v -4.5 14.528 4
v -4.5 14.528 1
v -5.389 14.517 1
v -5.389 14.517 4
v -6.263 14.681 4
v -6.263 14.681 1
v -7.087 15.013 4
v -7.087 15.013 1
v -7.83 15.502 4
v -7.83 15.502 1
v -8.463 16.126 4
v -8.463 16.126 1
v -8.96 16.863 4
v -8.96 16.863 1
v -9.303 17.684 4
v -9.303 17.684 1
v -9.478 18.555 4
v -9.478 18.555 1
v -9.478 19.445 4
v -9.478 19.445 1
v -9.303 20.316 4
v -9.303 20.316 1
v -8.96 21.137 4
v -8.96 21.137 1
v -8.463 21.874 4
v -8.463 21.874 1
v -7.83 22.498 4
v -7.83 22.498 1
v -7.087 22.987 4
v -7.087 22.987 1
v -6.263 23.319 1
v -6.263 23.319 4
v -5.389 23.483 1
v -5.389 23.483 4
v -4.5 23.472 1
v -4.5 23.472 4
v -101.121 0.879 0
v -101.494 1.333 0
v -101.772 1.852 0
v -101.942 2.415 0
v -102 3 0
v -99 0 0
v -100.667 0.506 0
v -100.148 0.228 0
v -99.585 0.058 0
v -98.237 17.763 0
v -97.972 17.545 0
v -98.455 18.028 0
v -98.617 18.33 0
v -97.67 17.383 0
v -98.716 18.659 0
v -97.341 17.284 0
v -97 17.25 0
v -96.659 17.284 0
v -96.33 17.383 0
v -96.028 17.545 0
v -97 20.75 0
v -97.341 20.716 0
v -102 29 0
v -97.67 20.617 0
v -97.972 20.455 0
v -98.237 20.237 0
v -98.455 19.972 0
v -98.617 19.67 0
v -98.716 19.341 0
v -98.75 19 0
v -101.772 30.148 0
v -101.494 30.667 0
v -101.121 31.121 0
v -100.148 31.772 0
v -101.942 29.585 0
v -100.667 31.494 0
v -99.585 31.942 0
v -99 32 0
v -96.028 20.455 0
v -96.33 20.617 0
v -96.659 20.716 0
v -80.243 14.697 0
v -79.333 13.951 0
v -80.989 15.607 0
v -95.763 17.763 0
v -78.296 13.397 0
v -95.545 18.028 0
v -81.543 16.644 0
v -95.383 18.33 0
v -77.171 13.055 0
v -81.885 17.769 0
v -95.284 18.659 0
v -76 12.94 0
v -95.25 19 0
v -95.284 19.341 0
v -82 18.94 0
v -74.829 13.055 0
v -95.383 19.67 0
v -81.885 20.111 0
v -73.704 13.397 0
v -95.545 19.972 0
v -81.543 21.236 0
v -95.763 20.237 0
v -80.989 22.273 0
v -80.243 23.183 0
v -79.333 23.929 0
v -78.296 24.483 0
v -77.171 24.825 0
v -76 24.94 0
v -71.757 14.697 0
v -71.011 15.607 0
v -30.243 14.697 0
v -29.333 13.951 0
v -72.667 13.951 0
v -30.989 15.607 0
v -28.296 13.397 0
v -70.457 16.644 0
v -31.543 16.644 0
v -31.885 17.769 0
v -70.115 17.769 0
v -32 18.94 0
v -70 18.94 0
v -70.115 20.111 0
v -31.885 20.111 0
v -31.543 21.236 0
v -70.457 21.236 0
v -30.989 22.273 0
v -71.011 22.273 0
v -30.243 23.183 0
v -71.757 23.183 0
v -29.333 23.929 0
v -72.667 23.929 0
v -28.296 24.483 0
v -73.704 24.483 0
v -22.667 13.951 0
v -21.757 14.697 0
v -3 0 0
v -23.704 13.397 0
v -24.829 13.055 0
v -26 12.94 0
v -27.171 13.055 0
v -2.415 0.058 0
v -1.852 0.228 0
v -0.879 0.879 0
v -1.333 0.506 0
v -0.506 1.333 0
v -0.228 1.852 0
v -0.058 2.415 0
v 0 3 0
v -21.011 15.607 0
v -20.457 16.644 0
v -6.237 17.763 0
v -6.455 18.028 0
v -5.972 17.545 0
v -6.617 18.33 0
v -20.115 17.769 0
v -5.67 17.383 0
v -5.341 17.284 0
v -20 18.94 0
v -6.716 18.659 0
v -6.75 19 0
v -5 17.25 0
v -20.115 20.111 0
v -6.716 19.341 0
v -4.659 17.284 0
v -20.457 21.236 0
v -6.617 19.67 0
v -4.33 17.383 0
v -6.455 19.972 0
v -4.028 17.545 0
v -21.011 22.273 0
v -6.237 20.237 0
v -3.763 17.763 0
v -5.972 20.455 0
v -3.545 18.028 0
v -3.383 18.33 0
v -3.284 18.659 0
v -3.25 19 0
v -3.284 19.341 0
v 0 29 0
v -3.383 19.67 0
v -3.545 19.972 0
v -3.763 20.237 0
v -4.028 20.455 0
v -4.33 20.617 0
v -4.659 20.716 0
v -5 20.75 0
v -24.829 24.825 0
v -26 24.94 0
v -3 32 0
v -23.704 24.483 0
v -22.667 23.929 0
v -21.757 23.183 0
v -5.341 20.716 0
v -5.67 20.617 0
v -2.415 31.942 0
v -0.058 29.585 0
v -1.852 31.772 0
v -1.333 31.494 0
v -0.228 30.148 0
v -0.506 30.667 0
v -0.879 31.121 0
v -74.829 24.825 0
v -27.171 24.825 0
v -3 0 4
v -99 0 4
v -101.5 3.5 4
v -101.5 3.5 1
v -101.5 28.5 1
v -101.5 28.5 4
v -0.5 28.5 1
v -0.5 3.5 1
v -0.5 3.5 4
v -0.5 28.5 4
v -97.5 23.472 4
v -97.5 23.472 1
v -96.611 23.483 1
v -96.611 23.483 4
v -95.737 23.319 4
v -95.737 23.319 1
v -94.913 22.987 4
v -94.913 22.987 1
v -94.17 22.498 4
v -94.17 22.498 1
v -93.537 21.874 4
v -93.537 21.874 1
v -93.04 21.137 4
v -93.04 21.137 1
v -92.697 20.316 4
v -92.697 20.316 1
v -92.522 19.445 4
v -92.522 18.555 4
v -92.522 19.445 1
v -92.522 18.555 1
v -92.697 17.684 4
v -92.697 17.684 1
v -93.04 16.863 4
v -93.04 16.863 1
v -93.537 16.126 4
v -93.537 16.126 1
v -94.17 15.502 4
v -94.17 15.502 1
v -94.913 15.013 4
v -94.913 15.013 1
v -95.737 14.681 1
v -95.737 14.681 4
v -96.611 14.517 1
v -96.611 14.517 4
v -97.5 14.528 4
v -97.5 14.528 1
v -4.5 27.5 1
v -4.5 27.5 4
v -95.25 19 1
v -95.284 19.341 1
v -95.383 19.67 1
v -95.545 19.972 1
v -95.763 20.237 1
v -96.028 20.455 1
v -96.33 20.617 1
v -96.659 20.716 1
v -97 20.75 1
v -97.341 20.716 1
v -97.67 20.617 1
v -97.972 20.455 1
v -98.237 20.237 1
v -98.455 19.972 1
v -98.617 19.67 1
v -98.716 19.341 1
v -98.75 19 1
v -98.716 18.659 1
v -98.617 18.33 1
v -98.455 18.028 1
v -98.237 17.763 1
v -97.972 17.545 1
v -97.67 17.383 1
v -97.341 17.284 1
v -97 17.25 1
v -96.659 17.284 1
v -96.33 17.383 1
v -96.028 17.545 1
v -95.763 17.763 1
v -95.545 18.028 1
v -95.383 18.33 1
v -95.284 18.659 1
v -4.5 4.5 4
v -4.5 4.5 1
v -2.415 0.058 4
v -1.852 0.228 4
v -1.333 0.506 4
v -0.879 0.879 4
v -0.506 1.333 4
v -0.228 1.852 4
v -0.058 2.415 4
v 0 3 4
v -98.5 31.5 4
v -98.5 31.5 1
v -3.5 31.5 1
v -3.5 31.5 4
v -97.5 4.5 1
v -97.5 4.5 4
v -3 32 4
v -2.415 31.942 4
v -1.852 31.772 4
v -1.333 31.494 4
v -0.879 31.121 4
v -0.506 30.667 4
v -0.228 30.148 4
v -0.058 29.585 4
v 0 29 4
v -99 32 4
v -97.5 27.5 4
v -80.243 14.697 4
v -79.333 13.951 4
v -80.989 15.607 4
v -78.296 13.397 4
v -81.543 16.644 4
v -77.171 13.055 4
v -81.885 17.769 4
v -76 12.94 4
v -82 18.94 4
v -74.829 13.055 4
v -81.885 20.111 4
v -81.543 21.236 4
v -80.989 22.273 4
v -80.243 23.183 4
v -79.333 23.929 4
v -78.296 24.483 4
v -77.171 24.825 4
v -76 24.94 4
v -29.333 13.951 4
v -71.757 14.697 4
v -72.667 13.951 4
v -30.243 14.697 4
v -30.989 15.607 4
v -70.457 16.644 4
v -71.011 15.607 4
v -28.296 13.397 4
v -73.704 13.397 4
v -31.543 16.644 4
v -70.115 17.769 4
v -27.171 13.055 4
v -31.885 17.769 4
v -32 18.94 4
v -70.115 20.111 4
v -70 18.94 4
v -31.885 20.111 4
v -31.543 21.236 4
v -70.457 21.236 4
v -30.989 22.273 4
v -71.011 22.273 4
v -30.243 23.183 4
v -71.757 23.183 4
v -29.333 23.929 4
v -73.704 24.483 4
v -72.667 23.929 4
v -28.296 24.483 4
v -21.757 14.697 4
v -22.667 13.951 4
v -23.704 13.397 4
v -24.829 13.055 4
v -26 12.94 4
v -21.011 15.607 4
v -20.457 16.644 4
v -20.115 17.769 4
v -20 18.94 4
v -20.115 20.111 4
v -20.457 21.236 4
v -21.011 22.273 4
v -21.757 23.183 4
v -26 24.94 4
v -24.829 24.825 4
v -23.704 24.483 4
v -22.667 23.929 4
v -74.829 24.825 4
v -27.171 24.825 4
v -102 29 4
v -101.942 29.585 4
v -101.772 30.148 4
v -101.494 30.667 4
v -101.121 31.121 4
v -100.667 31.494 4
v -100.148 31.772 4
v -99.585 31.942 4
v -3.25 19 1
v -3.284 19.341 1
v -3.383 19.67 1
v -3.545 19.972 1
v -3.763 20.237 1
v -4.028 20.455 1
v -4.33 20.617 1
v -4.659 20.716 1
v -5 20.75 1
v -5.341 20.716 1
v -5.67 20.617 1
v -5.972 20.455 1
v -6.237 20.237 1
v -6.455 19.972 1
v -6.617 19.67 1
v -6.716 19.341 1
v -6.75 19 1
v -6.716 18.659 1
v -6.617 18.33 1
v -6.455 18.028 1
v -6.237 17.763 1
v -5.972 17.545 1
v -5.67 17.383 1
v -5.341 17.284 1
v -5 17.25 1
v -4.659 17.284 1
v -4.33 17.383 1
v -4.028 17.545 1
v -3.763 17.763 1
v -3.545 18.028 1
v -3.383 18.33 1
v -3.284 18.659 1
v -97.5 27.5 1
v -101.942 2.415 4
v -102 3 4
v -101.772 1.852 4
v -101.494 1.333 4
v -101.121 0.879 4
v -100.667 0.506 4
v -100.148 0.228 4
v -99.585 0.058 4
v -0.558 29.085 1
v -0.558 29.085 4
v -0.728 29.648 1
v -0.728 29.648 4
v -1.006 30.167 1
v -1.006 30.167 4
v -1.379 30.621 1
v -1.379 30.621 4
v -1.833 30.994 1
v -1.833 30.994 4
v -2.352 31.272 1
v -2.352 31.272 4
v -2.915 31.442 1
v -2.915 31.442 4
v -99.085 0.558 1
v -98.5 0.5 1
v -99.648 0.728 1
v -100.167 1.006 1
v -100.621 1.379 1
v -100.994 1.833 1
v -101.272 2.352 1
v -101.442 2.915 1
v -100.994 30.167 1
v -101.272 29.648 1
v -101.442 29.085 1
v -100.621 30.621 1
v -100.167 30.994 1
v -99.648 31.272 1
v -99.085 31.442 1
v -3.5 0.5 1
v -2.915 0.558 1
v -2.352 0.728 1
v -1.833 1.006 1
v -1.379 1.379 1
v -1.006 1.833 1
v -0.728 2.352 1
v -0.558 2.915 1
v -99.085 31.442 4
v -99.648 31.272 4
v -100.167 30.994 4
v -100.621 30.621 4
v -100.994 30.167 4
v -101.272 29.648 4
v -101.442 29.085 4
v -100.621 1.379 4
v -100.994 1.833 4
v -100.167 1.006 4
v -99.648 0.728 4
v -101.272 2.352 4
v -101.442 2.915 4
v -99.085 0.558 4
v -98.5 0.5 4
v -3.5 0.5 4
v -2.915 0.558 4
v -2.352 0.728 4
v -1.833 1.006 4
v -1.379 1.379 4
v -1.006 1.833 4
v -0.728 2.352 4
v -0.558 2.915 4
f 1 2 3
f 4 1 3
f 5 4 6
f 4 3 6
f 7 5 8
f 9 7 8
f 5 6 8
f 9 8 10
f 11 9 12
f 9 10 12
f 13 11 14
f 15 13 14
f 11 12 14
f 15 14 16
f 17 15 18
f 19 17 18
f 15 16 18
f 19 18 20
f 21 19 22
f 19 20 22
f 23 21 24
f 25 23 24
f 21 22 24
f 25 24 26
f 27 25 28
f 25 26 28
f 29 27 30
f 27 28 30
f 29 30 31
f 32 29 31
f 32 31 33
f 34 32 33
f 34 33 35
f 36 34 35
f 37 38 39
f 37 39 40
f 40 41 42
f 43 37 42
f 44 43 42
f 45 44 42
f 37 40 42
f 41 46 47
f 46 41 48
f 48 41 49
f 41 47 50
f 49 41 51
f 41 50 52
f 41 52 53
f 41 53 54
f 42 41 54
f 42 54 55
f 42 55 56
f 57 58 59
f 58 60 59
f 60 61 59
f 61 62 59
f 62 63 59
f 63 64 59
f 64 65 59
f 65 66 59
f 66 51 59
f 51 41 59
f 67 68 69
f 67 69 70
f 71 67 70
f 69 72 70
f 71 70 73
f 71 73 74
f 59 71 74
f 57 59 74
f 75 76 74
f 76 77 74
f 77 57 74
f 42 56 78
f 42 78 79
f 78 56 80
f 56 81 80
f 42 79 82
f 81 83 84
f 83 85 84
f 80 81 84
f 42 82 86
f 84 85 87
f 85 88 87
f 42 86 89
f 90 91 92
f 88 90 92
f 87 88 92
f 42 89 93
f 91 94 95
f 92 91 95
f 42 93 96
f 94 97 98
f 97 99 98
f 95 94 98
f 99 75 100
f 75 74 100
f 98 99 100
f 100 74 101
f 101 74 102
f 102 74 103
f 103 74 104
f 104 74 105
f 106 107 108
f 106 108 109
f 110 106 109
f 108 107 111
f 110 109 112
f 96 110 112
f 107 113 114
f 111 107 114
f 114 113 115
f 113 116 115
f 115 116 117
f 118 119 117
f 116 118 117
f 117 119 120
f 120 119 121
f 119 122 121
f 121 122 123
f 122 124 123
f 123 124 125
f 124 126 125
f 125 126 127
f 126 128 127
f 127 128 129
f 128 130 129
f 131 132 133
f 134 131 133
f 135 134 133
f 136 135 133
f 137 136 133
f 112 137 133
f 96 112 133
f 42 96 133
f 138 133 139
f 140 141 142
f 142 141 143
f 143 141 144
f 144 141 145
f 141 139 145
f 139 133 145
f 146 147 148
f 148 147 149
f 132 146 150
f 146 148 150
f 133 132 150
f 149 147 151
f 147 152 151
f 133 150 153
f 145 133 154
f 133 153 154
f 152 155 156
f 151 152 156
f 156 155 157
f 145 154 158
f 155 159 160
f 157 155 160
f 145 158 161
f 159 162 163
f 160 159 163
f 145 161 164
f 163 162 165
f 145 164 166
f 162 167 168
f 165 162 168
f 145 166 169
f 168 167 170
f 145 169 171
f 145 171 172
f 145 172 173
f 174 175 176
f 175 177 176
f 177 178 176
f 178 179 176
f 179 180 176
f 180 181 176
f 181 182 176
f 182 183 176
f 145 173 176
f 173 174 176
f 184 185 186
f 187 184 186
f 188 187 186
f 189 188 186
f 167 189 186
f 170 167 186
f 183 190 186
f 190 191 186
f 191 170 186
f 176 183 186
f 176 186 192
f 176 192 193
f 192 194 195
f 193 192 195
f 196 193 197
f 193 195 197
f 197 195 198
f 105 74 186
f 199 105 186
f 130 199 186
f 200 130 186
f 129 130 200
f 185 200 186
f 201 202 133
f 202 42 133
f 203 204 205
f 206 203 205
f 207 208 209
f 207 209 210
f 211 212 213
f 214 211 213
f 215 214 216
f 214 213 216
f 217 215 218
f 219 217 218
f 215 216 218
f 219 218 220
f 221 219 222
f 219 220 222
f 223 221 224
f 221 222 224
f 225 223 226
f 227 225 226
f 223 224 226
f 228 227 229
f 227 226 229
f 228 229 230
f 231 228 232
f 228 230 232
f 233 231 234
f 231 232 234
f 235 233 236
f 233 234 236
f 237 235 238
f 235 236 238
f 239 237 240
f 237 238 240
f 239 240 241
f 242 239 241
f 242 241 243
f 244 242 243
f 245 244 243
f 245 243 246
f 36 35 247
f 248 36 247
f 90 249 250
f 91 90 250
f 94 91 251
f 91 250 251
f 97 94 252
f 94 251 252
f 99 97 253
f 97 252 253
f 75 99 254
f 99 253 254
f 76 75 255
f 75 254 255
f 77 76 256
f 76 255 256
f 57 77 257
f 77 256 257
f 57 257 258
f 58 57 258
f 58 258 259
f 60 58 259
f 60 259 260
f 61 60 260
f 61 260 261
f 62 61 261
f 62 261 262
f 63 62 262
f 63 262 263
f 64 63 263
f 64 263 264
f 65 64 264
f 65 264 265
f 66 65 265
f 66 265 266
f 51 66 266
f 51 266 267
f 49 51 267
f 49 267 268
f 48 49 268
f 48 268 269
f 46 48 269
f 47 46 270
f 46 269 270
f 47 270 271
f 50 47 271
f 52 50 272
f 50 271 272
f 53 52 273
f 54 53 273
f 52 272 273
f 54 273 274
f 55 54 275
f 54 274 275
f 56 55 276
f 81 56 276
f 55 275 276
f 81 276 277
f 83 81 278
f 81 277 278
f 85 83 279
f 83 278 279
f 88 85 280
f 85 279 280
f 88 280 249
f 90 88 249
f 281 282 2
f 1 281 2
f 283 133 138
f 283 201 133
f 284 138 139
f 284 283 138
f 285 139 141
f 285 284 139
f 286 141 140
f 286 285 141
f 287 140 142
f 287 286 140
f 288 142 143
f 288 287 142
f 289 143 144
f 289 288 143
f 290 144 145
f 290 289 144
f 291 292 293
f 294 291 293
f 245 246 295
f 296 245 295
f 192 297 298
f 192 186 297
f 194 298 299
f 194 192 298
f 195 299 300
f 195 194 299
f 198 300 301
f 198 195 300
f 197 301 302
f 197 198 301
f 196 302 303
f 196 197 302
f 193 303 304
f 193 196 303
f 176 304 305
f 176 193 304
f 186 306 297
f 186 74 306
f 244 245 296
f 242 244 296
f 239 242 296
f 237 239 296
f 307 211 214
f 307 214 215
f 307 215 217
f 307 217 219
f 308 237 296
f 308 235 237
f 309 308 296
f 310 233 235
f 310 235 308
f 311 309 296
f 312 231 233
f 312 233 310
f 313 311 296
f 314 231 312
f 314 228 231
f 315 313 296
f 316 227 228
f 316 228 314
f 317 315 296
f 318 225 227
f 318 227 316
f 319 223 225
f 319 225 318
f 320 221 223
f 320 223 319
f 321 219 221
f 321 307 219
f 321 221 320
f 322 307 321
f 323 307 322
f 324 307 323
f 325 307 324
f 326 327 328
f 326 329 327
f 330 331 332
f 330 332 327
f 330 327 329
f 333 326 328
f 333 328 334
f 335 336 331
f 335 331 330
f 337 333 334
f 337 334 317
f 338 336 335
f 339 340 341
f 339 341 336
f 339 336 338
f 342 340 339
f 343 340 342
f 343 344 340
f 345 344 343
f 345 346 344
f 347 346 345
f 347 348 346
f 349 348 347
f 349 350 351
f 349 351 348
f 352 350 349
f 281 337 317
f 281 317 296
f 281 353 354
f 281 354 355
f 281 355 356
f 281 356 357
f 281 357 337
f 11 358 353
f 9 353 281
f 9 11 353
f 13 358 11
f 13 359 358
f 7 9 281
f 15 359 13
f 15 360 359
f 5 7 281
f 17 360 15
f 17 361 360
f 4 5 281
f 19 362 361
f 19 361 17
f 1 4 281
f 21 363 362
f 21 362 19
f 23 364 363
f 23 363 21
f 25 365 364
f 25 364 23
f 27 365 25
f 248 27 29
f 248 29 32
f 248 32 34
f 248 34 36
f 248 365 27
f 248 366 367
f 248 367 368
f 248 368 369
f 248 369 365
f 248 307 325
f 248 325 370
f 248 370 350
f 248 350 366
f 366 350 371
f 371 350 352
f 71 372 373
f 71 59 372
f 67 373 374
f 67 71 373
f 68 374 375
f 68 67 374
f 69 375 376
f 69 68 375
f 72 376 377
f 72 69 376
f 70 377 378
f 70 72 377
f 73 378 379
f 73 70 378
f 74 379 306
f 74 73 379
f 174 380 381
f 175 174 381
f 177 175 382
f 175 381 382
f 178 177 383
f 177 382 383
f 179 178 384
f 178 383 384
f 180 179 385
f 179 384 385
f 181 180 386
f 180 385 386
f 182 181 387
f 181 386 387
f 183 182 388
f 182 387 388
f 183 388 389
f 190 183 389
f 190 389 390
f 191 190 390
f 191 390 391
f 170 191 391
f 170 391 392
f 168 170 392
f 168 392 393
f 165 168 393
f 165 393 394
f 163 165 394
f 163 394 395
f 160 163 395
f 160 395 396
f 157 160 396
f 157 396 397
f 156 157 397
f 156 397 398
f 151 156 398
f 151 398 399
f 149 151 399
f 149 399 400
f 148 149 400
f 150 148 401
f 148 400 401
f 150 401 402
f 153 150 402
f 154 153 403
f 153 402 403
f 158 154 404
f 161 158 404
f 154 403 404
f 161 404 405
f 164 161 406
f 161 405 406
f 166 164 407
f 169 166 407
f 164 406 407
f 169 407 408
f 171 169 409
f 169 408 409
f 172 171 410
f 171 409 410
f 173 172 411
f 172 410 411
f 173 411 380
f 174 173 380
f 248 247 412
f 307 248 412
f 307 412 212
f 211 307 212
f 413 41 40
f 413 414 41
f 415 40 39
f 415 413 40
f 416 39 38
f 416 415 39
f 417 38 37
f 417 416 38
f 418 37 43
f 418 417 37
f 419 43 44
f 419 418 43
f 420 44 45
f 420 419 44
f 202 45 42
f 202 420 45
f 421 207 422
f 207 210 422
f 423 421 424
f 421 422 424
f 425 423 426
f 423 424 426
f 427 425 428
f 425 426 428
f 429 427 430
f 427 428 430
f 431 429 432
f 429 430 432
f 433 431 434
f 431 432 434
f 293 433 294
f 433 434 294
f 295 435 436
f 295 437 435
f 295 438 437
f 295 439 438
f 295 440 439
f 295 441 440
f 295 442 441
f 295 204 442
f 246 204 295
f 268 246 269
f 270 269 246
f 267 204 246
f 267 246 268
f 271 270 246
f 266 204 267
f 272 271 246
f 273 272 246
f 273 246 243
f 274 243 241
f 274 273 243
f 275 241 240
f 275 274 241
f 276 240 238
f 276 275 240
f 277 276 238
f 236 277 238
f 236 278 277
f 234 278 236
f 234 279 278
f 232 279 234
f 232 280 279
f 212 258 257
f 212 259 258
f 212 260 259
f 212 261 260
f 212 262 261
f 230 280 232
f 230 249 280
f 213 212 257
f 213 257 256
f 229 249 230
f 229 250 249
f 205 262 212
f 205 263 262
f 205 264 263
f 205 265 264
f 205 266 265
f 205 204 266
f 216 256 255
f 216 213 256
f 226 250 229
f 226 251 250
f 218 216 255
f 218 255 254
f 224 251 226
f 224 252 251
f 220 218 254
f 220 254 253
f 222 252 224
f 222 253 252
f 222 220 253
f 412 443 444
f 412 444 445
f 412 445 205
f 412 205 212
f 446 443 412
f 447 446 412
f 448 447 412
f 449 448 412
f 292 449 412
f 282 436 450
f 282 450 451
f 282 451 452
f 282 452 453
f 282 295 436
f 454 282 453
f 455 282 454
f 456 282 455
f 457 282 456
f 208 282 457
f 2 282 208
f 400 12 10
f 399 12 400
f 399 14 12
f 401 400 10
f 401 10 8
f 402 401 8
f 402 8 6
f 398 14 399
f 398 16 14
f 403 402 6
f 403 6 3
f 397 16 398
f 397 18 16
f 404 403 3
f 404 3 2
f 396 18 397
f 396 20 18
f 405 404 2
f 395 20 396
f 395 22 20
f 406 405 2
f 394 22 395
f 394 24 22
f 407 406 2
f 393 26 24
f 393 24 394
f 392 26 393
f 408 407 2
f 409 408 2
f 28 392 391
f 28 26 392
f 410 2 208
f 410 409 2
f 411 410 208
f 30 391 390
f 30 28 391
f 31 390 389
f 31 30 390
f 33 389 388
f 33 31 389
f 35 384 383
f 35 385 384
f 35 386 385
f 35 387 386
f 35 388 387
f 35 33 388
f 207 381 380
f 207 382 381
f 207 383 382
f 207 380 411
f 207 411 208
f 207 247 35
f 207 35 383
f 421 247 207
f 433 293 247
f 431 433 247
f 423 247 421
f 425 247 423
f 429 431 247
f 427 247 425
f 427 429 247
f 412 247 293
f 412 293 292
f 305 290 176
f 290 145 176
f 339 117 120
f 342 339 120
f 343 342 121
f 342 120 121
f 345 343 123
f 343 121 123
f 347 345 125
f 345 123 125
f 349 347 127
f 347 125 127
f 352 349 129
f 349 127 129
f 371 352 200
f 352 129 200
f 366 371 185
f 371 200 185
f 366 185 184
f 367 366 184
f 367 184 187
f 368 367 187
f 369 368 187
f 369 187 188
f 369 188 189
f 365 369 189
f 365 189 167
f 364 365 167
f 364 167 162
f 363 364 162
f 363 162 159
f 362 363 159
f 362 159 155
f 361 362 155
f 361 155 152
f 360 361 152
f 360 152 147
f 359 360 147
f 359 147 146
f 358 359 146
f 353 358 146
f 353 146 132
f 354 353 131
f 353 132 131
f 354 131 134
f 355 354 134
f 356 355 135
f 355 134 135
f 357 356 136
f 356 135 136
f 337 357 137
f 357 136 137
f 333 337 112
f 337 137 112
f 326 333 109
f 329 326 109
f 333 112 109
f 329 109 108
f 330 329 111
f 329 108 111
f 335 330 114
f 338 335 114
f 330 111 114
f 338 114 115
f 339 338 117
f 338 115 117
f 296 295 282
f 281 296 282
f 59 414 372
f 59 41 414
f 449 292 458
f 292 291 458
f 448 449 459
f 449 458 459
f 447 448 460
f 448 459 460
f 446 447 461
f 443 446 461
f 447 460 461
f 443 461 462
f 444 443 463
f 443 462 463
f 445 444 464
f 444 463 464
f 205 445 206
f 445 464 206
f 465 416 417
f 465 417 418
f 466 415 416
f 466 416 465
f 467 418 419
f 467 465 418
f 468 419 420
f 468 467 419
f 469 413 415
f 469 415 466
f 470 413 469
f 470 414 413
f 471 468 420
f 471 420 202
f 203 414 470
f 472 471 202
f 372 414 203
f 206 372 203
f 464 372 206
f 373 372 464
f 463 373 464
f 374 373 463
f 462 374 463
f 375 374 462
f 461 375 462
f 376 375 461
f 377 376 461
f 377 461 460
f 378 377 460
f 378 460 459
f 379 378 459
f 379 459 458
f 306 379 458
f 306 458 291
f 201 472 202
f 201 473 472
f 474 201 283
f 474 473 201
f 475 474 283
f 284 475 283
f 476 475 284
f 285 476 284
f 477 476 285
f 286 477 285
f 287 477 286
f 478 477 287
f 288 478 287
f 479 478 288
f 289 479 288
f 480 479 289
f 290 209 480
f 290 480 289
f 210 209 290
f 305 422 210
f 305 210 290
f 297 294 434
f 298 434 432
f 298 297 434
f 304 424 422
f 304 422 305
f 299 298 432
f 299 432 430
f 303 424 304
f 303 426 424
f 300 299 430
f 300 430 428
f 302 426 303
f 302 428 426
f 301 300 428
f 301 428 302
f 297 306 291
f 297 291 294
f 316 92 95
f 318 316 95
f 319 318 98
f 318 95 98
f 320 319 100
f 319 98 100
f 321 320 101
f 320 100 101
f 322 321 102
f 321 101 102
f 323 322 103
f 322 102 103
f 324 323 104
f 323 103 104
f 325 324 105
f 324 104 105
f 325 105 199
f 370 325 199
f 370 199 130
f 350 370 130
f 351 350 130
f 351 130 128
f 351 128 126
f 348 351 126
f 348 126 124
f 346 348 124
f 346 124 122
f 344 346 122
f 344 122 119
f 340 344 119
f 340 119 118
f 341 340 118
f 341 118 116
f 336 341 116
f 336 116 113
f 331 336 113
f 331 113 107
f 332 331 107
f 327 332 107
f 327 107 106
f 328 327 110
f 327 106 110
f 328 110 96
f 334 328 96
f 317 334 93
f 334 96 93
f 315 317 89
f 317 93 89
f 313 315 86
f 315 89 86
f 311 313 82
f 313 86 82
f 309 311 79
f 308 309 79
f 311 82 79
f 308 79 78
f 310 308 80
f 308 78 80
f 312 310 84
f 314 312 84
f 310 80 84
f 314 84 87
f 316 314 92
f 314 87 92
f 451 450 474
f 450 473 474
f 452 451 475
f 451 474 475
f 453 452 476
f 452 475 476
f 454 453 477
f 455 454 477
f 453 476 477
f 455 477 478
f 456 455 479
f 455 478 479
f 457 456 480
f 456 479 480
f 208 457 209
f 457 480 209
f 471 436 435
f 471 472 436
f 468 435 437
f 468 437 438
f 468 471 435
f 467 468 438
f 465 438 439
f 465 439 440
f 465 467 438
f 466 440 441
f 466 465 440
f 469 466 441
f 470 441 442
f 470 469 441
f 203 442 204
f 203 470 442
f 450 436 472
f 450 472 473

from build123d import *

# Parameters (mm, degrees)
SKETCH1_W           = 102
SKETCH1_H           = 32
BOSS_EXTRUDE1_DEPTH = 1
SKETCH2_W           = 102
SKETCH2_H           = 32
SKETCH2_W_2         = 101
SKETCH2_H_2         = 31
BOSS_EXTRUDE2_DEPTH = 3
SKETCH3_R           = 1.75
CUT_EXTRUDE1_DEPTH  = 107.943910533
FILLET1_R           = 3
SKETCH4_R           = 6
CUT_EXTRUDE2_DEPTH  = 107.976632963


with BuildPart() as part:
    # Sketch1 → Boss-Extrude1 (new body)
    with BuildSketch(Plane.XY):
        with Locations((-51, 16)):
            Rectangle(SKETCH1_W, SKETCH1_H)
    extrude(amount=BOSS_EXTRUDE1_DEPTH)

    # Sketch2 → Boss-Extrude2 (add)
    # profile 1 of 2: a face of its own
    with BuildSketch(Plane.XY.offset(1)):
        with Locations((-51, 16)):
            Rectangle(SKETCH2_W, SKETCH2_H)
        with Locations((-51, 16)):
            Rectangle(SKETCH2_W_2, SKETCH2_H_2, mode=Mode.SUBTRACT)
    # profile 2 of 2: a face of its own
    with BuildSketch(Plane.XY.offset(1)):
        with BuildLine():
            Line((-97.5, 14.527864045), (-97.5, 4.5))
            Line((-97.5, 4.5), (-4.5, 4.5))
            Line((-4.5, 4.5), (-4.5, 14.527864045))
            ThreePointArc((-4.5, 14.527864045), (-9.5, 19), (-4.5, 23.472135955))
            Line((-4.5, 23.472135955), (-4.5, 27.5))
            Line((-4.5, 27.5), (-97.5, 27.5))
            Line((-97.5, 27.5), (-97.5, 23.472135955))
            ThreePointArc((-97.5, 23.472135955), (-92.5, 19), (-97.5, 14.527864045))
        make_face()
    extrude(amount=BOSS_EXTRUDE2_DEPTH)

    # Sketch3 → Cut-Extrude1 (cut, through all)
    with BuildSketch(Plane.XY.offset(1)):
        with Locations((-97, 19)):
            Circle(SKETCH3_R)
        with Locations((-5, 19)):
            Circle(SKETCH3_R)
    extrude(amount=-CUT_EXTRUDE1_DEPTH, mode=Mode.SUBTRACT)

    # Fillet1
    fillet1_edges = [part.edges().sort_by_distance(p)[0] for p in [
        (-101.5, 31.5, 2.5),
        (-0.5, 31.5, 2.5),
        (-0.5, 0.5, 2.5),
        (-101.5, 0.5, 2.5),
        (0, 0, 2),
        (-102, 0, 2),
        (-102, 32, 2),
        (0, 32, 2),
    ]]
    fillet(fillet1_edges, radius=FILLET1_R)

    # Sketch4 → Cut-Extrude2 (cut, through all)
    with BuildSketch(Plane(origin=(0, 0, 0), x_dir=(-1, 0, 0), z_dir=(0, 0, -1))):
        with Locations((26, 18.94)):
            Circle(SKETCH4_R)
        with Locations((76, 18.94)):
            Circle(SKETCH4_R)
    extrude(amount=-CUT_EXTRUDE2_DEPTH, mode=Mode.SUBTRACT)


solid = part.part
